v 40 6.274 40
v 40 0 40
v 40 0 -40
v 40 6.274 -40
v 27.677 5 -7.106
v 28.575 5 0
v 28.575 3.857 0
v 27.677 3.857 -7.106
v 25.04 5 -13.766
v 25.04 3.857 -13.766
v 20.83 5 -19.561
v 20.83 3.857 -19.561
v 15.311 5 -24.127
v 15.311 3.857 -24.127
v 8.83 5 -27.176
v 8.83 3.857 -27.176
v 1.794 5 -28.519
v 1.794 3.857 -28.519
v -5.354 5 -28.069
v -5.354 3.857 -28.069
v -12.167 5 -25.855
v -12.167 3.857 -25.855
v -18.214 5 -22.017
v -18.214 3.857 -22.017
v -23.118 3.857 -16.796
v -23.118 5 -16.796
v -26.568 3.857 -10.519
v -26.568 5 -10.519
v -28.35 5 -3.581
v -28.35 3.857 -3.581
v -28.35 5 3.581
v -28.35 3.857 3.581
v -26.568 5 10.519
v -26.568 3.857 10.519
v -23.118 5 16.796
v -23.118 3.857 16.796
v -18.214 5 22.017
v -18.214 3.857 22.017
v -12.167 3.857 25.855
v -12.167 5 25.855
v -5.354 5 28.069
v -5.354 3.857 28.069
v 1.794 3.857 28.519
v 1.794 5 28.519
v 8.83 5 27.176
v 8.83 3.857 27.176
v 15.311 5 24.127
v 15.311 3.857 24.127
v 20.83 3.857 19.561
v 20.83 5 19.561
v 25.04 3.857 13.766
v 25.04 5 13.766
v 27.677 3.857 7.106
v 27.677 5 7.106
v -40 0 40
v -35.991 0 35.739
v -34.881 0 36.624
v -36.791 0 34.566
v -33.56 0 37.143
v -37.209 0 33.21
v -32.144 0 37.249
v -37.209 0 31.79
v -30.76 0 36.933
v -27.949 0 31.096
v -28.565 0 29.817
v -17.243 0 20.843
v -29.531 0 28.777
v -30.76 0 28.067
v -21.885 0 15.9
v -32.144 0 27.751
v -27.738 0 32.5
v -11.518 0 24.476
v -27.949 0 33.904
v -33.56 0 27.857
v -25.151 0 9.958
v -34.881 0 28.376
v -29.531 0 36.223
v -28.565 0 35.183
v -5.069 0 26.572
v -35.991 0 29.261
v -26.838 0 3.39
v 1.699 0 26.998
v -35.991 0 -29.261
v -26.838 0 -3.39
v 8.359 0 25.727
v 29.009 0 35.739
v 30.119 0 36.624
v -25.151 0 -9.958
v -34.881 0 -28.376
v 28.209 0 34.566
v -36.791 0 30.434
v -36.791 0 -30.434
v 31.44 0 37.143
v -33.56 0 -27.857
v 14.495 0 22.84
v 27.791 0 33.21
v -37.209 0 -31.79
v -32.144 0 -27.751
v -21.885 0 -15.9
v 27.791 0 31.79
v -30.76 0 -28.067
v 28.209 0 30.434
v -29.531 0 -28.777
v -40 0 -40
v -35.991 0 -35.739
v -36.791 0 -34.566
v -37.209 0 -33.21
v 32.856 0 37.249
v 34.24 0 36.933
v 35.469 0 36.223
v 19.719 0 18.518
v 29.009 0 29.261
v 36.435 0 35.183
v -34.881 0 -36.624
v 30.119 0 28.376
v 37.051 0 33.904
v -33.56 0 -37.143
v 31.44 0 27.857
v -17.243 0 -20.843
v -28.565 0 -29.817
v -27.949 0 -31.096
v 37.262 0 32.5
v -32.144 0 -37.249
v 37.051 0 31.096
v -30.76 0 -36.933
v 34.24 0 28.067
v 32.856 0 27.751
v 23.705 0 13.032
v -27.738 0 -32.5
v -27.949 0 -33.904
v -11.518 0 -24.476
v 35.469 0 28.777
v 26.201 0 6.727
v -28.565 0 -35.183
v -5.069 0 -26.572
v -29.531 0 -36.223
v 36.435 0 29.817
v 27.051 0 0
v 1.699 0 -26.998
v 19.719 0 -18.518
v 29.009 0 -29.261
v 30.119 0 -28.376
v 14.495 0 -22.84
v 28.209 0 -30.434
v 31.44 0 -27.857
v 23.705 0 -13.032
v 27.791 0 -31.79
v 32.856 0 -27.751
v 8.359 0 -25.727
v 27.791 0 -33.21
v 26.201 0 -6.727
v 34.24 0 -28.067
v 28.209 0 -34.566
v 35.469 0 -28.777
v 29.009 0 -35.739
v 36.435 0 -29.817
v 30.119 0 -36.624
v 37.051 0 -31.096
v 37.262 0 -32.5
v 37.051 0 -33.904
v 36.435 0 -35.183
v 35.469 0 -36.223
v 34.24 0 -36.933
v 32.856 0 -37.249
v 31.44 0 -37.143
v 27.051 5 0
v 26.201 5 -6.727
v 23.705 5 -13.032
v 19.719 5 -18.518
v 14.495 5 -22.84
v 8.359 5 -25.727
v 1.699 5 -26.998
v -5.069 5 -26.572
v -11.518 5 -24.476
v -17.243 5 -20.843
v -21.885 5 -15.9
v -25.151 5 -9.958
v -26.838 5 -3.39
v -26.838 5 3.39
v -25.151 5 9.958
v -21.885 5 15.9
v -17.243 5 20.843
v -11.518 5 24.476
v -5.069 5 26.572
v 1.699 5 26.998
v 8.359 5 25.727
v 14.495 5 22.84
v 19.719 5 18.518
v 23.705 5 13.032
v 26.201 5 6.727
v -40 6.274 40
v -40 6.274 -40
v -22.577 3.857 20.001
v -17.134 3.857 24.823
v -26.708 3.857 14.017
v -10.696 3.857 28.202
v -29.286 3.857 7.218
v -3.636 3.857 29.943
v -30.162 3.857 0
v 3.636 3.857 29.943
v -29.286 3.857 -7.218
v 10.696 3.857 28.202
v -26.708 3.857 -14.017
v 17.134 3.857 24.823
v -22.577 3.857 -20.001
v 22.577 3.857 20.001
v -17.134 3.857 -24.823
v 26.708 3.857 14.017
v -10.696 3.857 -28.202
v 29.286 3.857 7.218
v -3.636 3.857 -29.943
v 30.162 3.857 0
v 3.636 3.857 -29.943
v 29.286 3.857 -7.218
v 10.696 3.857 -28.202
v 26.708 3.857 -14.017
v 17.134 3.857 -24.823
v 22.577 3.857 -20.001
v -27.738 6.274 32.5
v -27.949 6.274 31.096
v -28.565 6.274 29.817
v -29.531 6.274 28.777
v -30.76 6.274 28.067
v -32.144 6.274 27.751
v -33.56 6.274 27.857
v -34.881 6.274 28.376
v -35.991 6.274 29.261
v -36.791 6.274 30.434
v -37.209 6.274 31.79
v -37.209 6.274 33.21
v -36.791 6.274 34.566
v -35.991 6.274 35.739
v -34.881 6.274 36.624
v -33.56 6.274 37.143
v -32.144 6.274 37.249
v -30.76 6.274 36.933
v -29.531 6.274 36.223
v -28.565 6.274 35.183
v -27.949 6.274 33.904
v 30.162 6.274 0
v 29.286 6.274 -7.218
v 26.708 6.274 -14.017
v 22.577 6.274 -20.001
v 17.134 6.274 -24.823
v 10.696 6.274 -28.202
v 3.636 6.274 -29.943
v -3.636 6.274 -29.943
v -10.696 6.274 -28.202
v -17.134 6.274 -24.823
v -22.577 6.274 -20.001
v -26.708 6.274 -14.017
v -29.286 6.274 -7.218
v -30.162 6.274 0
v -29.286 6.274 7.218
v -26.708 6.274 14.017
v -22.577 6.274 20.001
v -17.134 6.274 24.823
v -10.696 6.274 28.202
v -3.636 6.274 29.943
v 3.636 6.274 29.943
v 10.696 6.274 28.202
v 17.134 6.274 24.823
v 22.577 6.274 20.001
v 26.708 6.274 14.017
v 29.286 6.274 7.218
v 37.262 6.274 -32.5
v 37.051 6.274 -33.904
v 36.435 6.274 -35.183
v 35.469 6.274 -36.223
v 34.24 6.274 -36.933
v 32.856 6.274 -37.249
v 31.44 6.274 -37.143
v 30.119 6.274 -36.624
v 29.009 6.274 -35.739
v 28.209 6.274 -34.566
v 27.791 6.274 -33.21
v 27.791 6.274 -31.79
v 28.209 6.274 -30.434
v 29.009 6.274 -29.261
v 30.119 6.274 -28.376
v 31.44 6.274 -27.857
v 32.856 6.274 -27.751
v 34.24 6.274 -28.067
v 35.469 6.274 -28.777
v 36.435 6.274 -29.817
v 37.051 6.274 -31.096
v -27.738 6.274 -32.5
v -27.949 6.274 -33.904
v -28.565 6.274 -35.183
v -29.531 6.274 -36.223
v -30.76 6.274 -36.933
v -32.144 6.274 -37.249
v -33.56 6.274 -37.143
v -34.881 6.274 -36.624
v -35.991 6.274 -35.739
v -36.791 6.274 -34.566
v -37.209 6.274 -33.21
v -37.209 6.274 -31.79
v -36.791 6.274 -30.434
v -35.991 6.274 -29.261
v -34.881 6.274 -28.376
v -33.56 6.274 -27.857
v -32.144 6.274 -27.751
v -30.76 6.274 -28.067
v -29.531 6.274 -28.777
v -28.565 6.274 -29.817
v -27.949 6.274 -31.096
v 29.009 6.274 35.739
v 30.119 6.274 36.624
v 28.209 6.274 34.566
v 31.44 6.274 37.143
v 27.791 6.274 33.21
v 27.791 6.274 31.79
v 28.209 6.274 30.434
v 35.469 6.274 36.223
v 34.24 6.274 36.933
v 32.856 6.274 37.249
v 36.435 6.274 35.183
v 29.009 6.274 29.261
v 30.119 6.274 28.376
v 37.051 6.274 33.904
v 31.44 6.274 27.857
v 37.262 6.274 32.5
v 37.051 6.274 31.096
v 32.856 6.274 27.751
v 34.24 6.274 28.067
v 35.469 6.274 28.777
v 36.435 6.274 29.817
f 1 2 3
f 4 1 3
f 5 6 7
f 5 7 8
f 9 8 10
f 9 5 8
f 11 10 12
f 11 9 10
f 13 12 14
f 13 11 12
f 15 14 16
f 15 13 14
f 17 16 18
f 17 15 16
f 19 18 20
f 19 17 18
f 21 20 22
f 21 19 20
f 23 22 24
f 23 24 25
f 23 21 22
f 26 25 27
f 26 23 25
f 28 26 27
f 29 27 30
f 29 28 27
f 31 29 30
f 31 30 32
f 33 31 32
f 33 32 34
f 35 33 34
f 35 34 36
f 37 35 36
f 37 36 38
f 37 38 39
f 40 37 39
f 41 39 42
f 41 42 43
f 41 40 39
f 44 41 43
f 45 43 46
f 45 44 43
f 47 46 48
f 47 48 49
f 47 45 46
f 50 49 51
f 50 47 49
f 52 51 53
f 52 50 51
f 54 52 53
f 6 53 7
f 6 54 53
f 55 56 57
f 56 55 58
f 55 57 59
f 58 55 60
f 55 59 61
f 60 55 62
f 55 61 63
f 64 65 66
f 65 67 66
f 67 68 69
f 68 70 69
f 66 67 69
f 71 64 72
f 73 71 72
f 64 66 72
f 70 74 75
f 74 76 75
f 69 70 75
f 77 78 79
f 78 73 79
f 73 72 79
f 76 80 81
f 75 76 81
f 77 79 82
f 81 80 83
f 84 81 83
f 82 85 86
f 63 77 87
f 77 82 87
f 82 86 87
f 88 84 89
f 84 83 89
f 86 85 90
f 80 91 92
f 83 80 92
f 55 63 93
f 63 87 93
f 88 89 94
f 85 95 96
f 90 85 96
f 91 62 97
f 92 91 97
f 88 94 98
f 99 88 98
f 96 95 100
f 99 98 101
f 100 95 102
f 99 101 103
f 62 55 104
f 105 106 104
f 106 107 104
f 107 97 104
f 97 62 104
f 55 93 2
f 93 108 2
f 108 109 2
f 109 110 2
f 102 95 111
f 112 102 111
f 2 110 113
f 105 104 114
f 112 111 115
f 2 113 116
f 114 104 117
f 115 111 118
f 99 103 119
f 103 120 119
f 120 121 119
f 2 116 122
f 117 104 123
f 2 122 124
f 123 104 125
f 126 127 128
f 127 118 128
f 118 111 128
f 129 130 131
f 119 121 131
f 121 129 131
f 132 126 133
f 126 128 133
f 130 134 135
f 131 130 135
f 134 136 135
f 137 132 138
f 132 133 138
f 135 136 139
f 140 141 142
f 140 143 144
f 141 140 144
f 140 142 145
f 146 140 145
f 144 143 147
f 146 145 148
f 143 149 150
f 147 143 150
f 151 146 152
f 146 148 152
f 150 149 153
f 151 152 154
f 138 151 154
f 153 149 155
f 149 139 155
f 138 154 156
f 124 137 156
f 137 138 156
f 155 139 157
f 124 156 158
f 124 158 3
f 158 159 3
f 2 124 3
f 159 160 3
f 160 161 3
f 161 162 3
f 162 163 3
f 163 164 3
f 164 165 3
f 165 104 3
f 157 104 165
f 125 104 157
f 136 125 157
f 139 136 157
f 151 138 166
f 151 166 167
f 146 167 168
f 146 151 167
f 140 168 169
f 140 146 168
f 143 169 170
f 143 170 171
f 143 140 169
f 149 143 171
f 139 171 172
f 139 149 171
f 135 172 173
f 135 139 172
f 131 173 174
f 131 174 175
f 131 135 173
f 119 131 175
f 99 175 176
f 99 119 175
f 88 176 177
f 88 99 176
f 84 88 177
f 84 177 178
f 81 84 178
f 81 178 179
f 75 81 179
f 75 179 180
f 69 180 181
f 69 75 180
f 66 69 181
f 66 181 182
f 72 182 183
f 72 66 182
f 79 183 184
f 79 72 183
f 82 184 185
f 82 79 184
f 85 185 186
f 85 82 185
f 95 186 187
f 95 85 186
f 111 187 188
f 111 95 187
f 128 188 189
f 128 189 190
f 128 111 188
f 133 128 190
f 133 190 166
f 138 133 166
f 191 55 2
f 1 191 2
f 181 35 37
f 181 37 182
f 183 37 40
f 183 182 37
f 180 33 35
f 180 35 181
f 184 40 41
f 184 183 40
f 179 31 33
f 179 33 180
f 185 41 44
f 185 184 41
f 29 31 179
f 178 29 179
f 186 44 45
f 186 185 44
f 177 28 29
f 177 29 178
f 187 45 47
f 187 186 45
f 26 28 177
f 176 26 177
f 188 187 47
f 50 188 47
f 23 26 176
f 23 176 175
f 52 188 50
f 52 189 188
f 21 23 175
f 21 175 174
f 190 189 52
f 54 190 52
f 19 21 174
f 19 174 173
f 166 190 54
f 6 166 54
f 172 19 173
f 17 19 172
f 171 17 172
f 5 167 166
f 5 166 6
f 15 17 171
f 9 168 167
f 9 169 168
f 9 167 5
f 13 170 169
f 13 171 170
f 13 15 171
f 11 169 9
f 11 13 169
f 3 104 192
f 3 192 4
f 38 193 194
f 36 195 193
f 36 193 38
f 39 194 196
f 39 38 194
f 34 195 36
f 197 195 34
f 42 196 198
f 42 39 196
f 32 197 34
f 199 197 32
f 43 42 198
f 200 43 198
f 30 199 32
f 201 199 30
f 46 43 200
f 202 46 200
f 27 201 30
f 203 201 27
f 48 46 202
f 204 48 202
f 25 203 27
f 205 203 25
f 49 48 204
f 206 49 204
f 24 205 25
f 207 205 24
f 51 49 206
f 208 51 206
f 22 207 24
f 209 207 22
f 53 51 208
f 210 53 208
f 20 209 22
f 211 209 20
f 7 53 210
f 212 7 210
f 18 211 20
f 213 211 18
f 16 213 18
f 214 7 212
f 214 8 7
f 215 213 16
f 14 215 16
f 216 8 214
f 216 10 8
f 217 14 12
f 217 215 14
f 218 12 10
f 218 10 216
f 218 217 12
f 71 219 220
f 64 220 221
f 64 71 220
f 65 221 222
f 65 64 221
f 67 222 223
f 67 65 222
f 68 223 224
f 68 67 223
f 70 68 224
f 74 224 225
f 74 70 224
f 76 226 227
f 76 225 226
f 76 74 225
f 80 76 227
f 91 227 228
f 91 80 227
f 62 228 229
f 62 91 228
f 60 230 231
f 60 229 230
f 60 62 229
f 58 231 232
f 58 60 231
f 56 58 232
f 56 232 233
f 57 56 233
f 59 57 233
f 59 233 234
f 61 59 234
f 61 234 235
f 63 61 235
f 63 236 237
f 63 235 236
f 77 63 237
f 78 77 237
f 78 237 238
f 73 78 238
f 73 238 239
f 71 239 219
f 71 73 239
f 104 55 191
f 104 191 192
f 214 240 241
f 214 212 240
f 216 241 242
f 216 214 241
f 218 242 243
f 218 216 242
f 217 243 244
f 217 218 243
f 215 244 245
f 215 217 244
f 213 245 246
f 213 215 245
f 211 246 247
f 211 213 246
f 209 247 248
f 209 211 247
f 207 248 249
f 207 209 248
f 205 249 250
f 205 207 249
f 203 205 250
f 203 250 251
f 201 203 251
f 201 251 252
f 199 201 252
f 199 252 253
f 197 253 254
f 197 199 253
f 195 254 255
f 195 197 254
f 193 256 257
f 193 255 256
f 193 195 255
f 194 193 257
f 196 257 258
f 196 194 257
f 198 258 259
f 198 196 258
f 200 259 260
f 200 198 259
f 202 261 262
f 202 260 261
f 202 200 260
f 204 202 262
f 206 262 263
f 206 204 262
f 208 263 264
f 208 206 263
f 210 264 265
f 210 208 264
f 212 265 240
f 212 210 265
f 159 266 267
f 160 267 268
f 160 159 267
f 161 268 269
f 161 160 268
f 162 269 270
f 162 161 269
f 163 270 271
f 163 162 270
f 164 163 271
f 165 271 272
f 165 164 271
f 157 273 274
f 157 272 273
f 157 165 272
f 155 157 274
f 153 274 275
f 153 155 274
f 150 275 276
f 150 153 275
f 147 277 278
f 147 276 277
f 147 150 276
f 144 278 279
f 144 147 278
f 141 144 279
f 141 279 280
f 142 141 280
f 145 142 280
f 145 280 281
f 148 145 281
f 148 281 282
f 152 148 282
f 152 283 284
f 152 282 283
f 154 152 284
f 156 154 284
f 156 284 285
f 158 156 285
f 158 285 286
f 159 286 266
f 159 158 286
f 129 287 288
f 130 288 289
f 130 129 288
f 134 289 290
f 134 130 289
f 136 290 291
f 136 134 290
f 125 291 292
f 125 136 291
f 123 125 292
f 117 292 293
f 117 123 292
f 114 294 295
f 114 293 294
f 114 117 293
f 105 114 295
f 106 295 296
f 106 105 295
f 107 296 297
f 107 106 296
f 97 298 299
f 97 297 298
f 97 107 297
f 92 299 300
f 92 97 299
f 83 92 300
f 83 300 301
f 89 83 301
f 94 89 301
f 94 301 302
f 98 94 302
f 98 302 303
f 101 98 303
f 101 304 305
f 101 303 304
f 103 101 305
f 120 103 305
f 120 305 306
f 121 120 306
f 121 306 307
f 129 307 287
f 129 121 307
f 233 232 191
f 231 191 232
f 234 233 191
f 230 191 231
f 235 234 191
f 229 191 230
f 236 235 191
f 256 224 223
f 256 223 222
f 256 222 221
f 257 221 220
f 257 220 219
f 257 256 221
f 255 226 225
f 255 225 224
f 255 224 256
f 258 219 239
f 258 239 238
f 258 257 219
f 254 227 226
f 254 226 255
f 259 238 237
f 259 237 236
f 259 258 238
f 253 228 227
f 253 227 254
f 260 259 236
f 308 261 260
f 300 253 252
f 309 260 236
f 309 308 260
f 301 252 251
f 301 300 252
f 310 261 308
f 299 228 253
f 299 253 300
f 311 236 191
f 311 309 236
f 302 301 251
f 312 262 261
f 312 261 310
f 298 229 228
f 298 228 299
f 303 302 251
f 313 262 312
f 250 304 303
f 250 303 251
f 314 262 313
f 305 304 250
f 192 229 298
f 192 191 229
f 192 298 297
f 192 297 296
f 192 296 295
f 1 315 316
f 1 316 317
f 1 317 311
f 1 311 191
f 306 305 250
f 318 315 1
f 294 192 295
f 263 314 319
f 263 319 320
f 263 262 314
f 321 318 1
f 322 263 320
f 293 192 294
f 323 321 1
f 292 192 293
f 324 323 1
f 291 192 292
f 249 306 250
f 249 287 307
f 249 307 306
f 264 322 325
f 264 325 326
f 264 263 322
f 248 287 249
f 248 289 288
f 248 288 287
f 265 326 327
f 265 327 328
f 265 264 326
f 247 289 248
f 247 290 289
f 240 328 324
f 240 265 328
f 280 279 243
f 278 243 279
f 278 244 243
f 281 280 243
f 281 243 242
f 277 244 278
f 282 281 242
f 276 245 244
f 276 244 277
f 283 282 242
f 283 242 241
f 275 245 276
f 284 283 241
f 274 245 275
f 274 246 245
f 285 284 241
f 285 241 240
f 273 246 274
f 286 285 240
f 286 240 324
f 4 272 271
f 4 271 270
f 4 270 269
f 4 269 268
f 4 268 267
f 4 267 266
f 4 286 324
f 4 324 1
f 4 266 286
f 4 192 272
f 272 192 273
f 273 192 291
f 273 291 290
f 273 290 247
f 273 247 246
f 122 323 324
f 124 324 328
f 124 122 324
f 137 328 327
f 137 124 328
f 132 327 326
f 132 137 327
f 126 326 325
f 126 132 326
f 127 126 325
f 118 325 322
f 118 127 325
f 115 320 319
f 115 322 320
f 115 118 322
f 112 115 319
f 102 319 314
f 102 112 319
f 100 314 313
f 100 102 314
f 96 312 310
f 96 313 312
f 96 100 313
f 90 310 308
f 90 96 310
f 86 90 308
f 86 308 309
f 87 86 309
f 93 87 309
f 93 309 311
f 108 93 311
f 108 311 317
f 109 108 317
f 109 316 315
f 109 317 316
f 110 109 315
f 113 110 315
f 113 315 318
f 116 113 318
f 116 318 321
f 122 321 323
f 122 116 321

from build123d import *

# Parameters (mm, degrees)
PLATEOUTLINE_W      = 80
PLATEOUTLINE_H      = 80
BOSS_EXTRUDE1_DEPTH = 6.2738
RAILGUIDES_R        = 4.7625
CUT_EXTRUDE1_DEPTH  = 10
CUT_EXTRUDE2_START  = 5
FUELGRAINMOUNTING_R = 30.1625
CUT_EXTRUDE2_DEPTH  = 5
GASINTAKE_R         = 27.051
CUT_EXTRUDE3_DEPTH  = 5
CUT_EXTRUDE4_START  = 5
SKETCH1_R           = 30.1625
SKETCH1_R_2         = 28.575
CUT_EXTRUDE4_DEPTH  = 1.143


with BuildPart() as part:
    # plateOutline → Boss-Extrude1 (new body)
    with BuildSketch(Plane(origin=(0, 0, 0), x_dir=(1, 0, 0), z_dir=(0, 1, 0))):
        Rectangle(PLATEOUTLINE_W, PLATEOUTLINE_H)
    extrude(amount=BOSS_EXTRUDE1_DEPTH)

    # railGuides → Cut-Extrude1 (cut)
    with BuildSketch(Plane(origin=(0, 0, 0), x_dir=(1, 0, 0), z_dir=(0, 1, 0))):
        with Locations((-32.5, 32.5)):
            Circle(RAILGUIDES_R)
        with Locations((32.5, 32.5)):
            Circle(RAILGUIDES_R)
        with Locations((32.5, -32.5)):
            Circle(RAILGUIDES_R)
        with Locations((-32.5, -32.5)):
            Circle(RAILGUIDES_R)
    extrude(amount=CUT_EXTRUDE1_DEPTH, mode=Mode.SUBTRACT)

    # FuelGrainMounting → Cut-Extrude2 (cut)
    with BuildSketch(Plane(origin=(0, 0, 0), x_dir=(1, 0, 0), z_dir=(0, 1, 0)).offset(CUT_EXTRUDE2_START)):
        Circle(FUELGRAINMOUNTING_R)
    extrude(amount=CUT_EXTRUDE2_DEPTH, mode=Mode.SUBTRACT)

    # GasIntake → Cut-Extrude3 (cut)
    with BuildSketch(Plane(origin=(0, 0, 0), x_dir=(1, 0, 0), z_dir=(0, 1, 0))):
        Circle(GASINTAKE_R)
    extrude(amount=CUT_EXTRUDE3_DEPTH, mode=Mode.SUBTRACT)

    # Sketch1 → Cut-Extrude4 (cut)
    with BuildSketch(Plane(origin=(0, 0, 0), x_dir=(1, 0, 0), z_dir=(0, 1, 0)).offset(CUT_EXTRUDE4_START)):
        Circle(SKETCH1_R)
        Circle(SKETCH1_R_2, mode=Mode.SUBTRACT)
    extrude(amount=-CUT_EXTRUDE4_DEPTH, mode=Mode.SUBTRACT)


solid = part.part
